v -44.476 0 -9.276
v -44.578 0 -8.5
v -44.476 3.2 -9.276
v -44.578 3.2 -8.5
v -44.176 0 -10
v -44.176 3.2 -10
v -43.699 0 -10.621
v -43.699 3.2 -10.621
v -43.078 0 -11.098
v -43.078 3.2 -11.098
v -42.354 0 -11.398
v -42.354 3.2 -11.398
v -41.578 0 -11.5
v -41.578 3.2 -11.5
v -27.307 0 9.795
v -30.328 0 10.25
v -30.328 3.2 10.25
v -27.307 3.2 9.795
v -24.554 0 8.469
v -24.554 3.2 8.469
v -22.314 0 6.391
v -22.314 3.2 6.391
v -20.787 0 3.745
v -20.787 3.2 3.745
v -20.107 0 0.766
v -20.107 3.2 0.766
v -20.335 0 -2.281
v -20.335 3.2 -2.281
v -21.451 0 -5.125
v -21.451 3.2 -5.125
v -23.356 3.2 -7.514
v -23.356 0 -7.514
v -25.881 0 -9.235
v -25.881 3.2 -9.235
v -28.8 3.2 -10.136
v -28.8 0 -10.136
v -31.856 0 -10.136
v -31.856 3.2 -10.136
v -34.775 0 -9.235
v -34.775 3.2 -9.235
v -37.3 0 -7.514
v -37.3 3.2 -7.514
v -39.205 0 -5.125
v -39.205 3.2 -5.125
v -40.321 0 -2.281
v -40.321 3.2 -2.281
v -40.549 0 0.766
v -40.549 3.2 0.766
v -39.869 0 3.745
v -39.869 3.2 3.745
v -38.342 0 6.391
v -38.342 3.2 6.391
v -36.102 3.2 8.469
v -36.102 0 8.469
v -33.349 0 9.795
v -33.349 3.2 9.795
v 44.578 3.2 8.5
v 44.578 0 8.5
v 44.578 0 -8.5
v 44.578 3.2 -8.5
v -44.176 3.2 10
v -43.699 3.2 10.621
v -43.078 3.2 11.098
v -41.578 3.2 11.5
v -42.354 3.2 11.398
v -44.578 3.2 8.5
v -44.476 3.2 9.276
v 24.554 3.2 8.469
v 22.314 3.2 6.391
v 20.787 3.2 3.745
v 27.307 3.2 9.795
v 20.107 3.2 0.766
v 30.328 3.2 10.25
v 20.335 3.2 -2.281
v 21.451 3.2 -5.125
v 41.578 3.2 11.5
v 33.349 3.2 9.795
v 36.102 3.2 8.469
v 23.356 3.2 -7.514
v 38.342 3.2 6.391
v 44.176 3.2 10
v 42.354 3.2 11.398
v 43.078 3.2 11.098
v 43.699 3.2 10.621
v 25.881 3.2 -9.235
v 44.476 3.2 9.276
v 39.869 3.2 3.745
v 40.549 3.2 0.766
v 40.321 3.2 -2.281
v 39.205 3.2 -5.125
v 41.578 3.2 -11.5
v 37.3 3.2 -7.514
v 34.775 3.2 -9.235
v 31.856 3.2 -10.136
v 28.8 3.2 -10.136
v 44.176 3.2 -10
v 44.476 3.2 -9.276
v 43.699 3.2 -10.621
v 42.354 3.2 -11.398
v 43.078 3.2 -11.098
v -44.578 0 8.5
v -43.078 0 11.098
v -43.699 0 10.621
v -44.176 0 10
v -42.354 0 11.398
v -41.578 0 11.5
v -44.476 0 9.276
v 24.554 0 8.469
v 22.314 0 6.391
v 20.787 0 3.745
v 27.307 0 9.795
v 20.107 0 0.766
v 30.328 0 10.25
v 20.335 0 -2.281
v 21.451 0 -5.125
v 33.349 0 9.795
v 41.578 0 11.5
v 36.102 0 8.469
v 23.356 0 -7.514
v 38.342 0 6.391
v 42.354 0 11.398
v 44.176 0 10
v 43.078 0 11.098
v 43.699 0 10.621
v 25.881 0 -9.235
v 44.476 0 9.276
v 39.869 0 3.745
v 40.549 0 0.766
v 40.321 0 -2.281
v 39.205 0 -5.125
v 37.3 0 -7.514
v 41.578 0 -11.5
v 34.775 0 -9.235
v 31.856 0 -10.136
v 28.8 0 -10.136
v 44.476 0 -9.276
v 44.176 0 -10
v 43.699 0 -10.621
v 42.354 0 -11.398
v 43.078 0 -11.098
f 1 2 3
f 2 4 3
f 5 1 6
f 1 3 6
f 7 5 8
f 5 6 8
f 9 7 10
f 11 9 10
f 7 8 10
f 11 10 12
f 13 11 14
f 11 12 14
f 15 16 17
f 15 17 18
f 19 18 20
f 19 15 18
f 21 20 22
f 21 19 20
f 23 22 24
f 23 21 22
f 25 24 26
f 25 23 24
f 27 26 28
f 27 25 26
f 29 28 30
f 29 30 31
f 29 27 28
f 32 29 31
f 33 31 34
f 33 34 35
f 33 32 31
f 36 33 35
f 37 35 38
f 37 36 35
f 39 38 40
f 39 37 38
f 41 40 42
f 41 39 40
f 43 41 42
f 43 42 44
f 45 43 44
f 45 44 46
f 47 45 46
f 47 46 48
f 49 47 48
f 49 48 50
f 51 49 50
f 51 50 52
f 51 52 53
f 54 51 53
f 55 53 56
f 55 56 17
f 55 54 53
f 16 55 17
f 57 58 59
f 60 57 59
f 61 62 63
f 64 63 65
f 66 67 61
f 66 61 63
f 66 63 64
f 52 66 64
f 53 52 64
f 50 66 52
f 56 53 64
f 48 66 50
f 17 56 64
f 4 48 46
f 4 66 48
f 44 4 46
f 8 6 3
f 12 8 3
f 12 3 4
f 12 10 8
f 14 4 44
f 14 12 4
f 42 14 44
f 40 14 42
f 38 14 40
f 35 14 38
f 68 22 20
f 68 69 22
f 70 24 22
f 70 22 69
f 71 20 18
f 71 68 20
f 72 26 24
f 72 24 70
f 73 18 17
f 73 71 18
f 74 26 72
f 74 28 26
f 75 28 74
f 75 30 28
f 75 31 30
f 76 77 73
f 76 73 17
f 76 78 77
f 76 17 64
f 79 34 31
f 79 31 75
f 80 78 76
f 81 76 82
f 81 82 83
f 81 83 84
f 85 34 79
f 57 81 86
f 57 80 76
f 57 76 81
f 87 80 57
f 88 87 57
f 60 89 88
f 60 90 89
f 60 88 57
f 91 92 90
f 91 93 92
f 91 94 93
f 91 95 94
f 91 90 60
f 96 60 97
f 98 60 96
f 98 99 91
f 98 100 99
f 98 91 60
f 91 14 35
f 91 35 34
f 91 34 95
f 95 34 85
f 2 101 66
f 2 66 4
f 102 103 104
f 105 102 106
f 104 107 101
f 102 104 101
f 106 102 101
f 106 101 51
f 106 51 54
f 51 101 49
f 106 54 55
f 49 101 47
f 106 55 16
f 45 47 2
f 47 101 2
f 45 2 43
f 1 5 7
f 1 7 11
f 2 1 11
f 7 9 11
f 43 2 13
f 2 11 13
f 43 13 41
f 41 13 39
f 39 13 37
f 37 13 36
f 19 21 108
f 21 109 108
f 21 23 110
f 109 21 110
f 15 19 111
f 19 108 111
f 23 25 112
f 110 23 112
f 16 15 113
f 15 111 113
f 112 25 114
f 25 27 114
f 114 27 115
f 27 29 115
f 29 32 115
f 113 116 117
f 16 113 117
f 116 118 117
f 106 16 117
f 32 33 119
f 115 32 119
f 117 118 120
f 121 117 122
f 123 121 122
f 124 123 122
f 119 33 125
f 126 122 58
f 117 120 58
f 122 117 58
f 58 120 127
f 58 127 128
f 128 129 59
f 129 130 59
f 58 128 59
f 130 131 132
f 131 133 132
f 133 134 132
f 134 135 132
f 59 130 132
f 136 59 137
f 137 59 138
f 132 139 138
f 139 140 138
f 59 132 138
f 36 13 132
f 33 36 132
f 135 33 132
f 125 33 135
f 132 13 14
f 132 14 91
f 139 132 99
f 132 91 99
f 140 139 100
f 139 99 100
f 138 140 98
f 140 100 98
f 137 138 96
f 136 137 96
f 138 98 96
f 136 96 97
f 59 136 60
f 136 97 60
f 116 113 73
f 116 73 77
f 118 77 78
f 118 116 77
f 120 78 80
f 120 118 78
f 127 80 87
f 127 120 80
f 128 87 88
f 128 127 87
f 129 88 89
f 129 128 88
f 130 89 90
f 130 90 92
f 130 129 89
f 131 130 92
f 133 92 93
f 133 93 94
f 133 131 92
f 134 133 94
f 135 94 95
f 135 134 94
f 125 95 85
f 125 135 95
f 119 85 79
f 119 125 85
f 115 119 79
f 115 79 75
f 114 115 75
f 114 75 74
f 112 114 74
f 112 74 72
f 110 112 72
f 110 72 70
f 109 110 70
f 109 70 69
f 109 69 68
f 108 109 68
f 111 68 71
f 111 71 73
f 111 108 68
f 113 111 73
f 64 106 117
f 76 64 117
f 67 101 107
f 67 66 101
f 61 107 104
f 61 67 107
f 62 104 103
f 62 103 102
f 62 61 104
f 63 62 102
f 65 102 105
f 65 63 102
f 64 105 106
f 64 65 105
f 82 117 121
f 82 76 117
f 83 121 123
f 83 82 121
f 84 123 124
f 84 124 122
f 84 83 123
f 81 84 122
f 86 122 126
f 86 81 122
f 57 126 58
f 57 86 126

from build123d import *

# Parameters (mm, degrees)
SKETCH1_W           = 89.156
SKETCH1_H           = 23
SKETCH1_R           = 10.25
BOSS_EXTRUDE1_DEPTH = 3.2
FILLET1_R           = 3


with BuildPart() as part:
    # Sketch1 → Boss-Extrude1 (new body)
    with BuildSketch(Plane(origin=(0, 0, 0), x_dir=(1, 0, 0), z_dir=(0, 1, 0))):
        Rectangle(SKETCH1_W, SKETCH1_H)
        with Locations(Location((30.328, 0, 0), (0, 0, 270))):
            Circle(SKETCH1_R, mode=Mode.SUBTRACT)
        with Locations(Location((-30.328, 0, 0), (0, 0, 270))):
            Circle(SKETCH1_R, mode=Mode.SUBTRACT)
    extrude(amount=BOSS_EXTRUDE1_DEPTH)

    # Fillet1
    fillet1_edges = [part.edges().sort_by_distance(p)[0] for p in [
        (44.578, 1.6, -11.5),
        (44.578, 1.6, 11.5),
        (-44.578, 1.6, 11.5),
        (-44.578, 1.6, -11.5),
    ]]
    fillet(fillet1_edges, radius=FILLET1_R)


solid = part.part
